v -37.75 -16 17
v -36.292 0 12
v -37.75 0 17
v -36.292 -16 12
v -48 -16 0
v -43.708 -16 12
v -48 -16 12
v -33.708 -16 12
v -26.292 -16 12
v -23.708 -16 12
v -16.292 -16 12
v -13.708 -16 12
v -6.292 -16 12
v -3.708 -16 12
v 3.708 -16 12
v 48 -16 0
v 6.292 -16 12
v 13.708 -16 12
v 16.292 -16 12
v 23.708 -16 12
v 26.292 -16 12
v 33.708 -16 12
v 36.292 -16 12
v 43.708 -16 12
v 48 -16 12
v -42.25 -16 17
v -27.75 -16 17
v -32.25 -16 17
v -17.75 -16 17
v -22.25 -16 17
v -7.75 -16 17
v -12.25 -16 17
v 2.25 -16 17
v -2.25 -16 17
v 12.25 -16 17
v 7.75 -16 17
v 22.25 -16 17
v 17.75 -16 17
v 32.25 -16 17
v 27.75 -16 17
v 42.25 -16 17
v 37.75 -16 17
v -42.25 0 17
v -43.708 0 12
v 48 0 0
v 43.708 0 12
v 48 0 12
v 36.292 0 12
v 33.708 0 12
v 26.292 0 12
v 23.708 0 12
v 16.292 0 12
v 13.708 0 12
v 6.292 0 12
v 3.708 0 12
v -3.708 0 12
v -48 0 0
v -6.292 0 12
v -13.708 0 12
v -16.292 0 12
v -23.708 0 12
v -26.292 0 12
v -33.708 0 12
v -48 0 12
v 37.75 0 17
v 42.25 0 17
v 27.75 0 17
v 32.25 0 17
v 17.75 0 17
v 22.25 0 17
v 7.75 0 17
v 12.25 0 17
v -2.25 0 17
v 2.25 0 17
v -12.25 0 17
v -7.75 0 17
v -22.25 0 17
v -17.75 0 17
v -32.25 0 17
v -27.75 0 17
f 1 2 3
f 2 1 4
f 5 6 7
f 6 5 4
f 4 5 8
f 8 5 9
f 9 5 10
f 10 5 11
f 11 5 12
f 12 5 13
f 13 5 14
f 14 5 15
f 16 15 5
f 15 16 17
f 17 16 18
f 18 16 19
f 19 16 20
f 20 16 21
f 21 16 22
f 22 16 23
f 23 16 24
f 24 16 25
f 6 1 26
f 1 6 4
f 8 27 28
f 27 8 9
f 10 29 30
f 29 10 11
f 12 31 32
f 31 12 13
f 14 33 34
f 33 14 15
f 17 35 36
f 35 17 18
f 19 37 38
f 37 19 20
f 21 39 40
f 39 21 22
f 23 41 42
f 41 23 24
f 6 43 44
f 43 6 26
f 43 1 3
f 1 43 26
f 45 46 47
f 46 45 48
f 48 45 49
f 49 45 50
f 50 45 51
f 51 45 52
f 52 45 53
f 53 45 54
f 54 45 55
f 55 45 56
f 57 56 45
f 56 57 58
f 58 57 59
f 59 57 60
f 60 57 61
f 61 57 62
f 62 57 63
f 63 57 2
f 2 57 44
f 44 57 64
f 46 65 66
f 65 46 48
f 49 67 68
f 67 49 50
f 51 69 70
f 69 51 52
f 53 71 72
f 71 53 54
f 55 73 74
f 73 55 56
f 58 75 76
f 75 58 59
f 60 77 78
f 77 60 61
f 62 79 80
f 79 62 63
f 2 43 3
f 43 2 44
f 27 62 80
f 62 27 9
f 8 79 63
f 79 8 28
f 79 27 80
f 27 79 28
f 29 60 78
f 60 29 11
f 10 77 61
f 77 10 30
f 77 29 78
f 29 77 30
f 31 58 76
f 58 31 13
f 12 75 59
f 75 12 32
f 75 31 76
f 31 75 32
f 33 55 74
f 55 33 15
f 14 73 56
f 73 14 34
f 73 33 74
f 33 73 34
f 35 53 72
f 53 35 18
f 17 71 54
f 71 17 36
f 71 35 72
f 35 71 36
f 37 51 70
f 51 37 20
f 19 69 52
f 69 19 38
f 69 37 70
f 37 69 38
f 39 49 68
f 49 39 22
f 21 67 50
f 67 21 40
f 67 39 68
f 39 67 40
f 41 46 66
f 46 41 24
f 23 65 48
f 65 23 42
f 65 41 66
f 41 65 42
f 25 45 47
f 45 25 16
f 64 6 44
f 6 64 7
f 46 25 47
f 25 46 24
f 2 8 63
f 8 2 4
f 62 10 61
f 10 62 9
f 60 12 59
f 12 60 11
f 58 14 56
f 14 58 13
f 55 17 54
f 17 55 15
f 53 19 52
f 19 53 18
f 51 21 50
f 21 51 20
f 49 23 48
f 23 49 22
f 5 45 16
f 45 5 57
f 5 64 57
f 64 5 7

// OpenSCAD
$fn = 32;

// ----------------------------------------------------------------------
// Toothed rack, 9 teeth
// 10 mm pitch, 5 mm teeth
// ----------------------------------------------------------------------

// --- parameters (mm) ---
bar_w = 16;     // bar width (Y)
bar_h = 12;     // bar height (Z)
teeth = 9;      // number of teeth
pitch = 10;     // tooth pitch
tooth_h = 5;    // tooth height above the bar
root_w = 8;     // tooth width at the root
crest_w = 4.5;  // tooth width at the crest

// --- derived feature positions (mm) ---
span = (teeth - 1) * pitch;  // = 80   distance between the outer teeth
bar_l = span + root_w + 8;   // = 96   bar length: teeth plus 4 mm at each end
tooth_x = -span / 2;         // = -40   X of the first tooth
height = bar_h + tooth_h;    // = 17   overall height
feature_centers = [
  [tooth_x + 0 * pitch, -bar_w / 2],
  [tooth_x + 1 * pitch, -bar_w / 2],
  [tooth_x + 2 * pitch, -bar_w / 2],
  [tooth_x + 3 * pitch, -bar_w / 2],
  [tooth_x + 4 * pitch, -bar_w / 2],
  [tooth_x + 5 * pitch, -bar_w / 2],
  [tooth_x + 6 * pitch, -bar_w / 2],
  [tooth_x + 7 * pitch, -bar_w / 2],
  [tooth_x + 8 * pitch, -bar_w / 2]
];   // tooth centre line, drives the tooth loop

// bar with a rack of teeth, one extruded trapezoium per centre
module rack_tooth() {
  linear_extrude(height = bar_w)
    polygon(points = [
      [0, 0],
      [root_w, 0],
      [root_w / 2 + crest_w / 2, tooth_h + 1],
      [root_w / 2 - crest_w / 2, tooth_h + 1]
    ]);
}

union() {
  translate([-bar_l / 2, -bar_w, 0]) cube([bar_l, bar_w, bar_h]);
  for (centre = feature_centers)
    translate([centre[0] - root_w / 2, 0, bar_h - 1]) rotate([90, 0, 0]) rack_tooth();
}
